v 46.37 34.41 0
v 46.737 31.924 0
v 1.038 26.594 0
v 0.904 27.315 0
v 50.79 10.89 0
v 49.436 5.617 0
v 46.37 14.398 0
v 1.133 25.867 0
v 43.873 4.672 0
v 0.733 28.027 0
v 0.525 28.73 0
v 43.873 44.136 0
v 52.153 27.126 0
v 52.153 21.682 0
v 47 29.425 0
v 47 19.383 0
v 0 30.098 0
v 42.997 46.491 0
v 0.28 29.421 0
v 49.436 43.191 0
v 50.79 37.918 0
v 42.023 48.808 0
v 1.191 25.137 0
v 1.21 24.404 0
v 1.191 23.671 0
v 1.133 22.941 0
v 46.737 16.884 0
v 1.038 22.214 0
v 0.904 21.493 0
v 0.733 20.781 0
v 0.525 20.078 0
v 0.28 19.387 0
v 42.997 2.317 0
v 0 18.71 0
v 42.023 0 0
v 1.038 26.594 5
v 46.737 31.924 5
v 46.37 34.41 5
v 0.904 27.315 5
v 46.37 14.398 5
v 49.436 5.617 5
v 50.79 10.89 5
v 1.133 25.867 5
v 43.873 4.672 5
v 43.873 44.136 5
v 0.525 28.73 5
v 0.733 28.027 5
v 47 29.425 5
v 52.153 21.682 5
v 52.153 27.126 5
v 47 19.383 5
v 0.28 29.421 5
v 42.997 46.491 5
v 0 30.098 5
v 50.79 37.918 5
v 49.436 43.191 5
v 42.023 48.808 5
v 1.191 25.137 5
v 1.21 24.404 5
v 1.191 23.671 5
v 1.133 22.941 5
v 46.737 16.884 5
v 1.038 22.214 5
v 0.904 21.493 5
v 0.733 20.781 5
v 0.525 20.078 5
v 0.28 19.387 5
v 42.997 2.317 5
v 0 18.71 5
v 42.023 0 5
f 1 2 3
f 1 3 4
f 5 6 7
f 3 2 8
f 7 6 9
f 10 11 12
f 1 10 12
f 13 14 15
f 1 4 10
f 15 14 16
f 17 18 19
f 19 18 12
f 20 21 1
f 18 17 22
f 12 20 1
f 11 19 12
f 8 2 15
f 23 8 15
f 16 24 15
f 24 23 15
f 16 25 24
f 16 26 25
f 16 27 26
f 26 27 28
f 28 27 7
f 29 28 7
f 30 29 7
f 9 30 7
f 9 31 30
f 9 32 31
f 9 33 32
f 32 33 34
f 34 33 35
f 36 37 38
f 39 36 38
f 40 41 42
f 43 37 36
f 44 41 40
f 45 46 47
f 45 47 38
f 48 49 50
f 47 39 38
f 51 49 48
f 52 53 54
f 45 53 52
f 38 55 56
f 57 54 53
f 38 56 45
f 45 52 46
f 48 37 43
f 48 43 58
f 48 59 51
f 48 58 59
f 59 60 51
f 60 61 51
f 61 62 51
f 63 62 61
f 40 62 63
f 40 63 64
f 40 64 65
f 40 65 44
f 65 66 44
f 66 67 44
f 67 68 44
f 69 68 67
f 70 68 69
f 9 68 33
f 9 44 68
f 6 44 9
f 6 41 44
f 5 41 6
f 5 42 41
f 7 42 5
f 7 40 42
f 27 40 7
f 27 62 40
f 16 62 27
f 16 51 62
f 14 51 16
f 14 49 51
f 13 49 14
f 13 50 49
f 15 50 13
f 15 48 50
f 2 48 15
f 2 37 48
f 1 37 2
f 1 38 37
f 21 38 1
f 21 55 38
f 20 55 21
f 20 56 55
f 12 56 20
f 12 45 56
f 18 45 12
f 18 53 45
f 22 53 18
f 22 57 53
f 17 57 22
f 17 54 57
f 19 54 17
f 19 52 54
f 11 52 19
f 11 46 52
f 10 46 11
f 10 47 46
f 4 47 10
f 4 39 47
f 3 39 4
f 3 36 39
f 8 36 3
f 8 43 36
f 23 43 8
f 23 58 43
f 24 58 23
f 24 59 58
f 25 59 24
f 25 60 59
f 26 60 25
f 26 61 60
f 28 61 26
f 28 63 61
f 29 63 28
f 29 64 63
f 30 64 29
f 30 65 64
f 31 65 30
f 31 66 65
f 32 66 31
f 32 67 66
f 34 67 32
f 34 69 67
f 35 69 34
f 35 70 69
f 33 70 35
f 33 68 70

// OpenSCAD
$fn = 32;

// ----------------------------------------------------------------------
// Gear sector: 3 teeth on 48 degrees
// ----------------------------------------------------------------------

// --- parameters (mm) ---
sector_angle = 48;        // sector angle, degrees
root_r = 60;              // root circle radius
tooth_h = 5;              // tooth height over the root circle
teeth = 3;                // number of teeth on the sector
hub_r = 14;               // hub bore radius
plate_t = 5;              // sector thickness, Z
arc_step = 3;             // sampling step of the root/hub arcs, degrees

tip_r = root_r + tooth_h;  // tip circle radius

profile = [[42.023, 0], [42.997, 2.317], [43.873, 4.672], [49.436, 5.617], [50.79, 10.89], [46.37, 14.398], [46.737, 16.884], [47, 19.383], [52.153, 21.682], [52.153, 27.126], [47, 29.425], [46.737, 31.924], [46.37, 34.41], [50.79, 37.918], [49.436, 43.191], [43.873, 44.136], [42.997, 46.491], [42.023, 48.808], [0, 30.098], [0.28, 29.421], [0.525, 28.73], [0.733, 28.027], [0.904, 27.315], [1.038, 26.594], [1.133, 25.867], [1.191, 25.137], [1.21, 24.404], [1.191, 23.671], [1.133, 22.941], [1.038, 22.214], [0.904, 21.493], [0.733, 20.781], [0.525, 20.078], [0.28, 19.387], [0, 18.71]];  // primary outline, 35 points, counter clockwise

// --- the one profile operation ---
linear_extrude(height = plate_t) polygon(points = profile);
